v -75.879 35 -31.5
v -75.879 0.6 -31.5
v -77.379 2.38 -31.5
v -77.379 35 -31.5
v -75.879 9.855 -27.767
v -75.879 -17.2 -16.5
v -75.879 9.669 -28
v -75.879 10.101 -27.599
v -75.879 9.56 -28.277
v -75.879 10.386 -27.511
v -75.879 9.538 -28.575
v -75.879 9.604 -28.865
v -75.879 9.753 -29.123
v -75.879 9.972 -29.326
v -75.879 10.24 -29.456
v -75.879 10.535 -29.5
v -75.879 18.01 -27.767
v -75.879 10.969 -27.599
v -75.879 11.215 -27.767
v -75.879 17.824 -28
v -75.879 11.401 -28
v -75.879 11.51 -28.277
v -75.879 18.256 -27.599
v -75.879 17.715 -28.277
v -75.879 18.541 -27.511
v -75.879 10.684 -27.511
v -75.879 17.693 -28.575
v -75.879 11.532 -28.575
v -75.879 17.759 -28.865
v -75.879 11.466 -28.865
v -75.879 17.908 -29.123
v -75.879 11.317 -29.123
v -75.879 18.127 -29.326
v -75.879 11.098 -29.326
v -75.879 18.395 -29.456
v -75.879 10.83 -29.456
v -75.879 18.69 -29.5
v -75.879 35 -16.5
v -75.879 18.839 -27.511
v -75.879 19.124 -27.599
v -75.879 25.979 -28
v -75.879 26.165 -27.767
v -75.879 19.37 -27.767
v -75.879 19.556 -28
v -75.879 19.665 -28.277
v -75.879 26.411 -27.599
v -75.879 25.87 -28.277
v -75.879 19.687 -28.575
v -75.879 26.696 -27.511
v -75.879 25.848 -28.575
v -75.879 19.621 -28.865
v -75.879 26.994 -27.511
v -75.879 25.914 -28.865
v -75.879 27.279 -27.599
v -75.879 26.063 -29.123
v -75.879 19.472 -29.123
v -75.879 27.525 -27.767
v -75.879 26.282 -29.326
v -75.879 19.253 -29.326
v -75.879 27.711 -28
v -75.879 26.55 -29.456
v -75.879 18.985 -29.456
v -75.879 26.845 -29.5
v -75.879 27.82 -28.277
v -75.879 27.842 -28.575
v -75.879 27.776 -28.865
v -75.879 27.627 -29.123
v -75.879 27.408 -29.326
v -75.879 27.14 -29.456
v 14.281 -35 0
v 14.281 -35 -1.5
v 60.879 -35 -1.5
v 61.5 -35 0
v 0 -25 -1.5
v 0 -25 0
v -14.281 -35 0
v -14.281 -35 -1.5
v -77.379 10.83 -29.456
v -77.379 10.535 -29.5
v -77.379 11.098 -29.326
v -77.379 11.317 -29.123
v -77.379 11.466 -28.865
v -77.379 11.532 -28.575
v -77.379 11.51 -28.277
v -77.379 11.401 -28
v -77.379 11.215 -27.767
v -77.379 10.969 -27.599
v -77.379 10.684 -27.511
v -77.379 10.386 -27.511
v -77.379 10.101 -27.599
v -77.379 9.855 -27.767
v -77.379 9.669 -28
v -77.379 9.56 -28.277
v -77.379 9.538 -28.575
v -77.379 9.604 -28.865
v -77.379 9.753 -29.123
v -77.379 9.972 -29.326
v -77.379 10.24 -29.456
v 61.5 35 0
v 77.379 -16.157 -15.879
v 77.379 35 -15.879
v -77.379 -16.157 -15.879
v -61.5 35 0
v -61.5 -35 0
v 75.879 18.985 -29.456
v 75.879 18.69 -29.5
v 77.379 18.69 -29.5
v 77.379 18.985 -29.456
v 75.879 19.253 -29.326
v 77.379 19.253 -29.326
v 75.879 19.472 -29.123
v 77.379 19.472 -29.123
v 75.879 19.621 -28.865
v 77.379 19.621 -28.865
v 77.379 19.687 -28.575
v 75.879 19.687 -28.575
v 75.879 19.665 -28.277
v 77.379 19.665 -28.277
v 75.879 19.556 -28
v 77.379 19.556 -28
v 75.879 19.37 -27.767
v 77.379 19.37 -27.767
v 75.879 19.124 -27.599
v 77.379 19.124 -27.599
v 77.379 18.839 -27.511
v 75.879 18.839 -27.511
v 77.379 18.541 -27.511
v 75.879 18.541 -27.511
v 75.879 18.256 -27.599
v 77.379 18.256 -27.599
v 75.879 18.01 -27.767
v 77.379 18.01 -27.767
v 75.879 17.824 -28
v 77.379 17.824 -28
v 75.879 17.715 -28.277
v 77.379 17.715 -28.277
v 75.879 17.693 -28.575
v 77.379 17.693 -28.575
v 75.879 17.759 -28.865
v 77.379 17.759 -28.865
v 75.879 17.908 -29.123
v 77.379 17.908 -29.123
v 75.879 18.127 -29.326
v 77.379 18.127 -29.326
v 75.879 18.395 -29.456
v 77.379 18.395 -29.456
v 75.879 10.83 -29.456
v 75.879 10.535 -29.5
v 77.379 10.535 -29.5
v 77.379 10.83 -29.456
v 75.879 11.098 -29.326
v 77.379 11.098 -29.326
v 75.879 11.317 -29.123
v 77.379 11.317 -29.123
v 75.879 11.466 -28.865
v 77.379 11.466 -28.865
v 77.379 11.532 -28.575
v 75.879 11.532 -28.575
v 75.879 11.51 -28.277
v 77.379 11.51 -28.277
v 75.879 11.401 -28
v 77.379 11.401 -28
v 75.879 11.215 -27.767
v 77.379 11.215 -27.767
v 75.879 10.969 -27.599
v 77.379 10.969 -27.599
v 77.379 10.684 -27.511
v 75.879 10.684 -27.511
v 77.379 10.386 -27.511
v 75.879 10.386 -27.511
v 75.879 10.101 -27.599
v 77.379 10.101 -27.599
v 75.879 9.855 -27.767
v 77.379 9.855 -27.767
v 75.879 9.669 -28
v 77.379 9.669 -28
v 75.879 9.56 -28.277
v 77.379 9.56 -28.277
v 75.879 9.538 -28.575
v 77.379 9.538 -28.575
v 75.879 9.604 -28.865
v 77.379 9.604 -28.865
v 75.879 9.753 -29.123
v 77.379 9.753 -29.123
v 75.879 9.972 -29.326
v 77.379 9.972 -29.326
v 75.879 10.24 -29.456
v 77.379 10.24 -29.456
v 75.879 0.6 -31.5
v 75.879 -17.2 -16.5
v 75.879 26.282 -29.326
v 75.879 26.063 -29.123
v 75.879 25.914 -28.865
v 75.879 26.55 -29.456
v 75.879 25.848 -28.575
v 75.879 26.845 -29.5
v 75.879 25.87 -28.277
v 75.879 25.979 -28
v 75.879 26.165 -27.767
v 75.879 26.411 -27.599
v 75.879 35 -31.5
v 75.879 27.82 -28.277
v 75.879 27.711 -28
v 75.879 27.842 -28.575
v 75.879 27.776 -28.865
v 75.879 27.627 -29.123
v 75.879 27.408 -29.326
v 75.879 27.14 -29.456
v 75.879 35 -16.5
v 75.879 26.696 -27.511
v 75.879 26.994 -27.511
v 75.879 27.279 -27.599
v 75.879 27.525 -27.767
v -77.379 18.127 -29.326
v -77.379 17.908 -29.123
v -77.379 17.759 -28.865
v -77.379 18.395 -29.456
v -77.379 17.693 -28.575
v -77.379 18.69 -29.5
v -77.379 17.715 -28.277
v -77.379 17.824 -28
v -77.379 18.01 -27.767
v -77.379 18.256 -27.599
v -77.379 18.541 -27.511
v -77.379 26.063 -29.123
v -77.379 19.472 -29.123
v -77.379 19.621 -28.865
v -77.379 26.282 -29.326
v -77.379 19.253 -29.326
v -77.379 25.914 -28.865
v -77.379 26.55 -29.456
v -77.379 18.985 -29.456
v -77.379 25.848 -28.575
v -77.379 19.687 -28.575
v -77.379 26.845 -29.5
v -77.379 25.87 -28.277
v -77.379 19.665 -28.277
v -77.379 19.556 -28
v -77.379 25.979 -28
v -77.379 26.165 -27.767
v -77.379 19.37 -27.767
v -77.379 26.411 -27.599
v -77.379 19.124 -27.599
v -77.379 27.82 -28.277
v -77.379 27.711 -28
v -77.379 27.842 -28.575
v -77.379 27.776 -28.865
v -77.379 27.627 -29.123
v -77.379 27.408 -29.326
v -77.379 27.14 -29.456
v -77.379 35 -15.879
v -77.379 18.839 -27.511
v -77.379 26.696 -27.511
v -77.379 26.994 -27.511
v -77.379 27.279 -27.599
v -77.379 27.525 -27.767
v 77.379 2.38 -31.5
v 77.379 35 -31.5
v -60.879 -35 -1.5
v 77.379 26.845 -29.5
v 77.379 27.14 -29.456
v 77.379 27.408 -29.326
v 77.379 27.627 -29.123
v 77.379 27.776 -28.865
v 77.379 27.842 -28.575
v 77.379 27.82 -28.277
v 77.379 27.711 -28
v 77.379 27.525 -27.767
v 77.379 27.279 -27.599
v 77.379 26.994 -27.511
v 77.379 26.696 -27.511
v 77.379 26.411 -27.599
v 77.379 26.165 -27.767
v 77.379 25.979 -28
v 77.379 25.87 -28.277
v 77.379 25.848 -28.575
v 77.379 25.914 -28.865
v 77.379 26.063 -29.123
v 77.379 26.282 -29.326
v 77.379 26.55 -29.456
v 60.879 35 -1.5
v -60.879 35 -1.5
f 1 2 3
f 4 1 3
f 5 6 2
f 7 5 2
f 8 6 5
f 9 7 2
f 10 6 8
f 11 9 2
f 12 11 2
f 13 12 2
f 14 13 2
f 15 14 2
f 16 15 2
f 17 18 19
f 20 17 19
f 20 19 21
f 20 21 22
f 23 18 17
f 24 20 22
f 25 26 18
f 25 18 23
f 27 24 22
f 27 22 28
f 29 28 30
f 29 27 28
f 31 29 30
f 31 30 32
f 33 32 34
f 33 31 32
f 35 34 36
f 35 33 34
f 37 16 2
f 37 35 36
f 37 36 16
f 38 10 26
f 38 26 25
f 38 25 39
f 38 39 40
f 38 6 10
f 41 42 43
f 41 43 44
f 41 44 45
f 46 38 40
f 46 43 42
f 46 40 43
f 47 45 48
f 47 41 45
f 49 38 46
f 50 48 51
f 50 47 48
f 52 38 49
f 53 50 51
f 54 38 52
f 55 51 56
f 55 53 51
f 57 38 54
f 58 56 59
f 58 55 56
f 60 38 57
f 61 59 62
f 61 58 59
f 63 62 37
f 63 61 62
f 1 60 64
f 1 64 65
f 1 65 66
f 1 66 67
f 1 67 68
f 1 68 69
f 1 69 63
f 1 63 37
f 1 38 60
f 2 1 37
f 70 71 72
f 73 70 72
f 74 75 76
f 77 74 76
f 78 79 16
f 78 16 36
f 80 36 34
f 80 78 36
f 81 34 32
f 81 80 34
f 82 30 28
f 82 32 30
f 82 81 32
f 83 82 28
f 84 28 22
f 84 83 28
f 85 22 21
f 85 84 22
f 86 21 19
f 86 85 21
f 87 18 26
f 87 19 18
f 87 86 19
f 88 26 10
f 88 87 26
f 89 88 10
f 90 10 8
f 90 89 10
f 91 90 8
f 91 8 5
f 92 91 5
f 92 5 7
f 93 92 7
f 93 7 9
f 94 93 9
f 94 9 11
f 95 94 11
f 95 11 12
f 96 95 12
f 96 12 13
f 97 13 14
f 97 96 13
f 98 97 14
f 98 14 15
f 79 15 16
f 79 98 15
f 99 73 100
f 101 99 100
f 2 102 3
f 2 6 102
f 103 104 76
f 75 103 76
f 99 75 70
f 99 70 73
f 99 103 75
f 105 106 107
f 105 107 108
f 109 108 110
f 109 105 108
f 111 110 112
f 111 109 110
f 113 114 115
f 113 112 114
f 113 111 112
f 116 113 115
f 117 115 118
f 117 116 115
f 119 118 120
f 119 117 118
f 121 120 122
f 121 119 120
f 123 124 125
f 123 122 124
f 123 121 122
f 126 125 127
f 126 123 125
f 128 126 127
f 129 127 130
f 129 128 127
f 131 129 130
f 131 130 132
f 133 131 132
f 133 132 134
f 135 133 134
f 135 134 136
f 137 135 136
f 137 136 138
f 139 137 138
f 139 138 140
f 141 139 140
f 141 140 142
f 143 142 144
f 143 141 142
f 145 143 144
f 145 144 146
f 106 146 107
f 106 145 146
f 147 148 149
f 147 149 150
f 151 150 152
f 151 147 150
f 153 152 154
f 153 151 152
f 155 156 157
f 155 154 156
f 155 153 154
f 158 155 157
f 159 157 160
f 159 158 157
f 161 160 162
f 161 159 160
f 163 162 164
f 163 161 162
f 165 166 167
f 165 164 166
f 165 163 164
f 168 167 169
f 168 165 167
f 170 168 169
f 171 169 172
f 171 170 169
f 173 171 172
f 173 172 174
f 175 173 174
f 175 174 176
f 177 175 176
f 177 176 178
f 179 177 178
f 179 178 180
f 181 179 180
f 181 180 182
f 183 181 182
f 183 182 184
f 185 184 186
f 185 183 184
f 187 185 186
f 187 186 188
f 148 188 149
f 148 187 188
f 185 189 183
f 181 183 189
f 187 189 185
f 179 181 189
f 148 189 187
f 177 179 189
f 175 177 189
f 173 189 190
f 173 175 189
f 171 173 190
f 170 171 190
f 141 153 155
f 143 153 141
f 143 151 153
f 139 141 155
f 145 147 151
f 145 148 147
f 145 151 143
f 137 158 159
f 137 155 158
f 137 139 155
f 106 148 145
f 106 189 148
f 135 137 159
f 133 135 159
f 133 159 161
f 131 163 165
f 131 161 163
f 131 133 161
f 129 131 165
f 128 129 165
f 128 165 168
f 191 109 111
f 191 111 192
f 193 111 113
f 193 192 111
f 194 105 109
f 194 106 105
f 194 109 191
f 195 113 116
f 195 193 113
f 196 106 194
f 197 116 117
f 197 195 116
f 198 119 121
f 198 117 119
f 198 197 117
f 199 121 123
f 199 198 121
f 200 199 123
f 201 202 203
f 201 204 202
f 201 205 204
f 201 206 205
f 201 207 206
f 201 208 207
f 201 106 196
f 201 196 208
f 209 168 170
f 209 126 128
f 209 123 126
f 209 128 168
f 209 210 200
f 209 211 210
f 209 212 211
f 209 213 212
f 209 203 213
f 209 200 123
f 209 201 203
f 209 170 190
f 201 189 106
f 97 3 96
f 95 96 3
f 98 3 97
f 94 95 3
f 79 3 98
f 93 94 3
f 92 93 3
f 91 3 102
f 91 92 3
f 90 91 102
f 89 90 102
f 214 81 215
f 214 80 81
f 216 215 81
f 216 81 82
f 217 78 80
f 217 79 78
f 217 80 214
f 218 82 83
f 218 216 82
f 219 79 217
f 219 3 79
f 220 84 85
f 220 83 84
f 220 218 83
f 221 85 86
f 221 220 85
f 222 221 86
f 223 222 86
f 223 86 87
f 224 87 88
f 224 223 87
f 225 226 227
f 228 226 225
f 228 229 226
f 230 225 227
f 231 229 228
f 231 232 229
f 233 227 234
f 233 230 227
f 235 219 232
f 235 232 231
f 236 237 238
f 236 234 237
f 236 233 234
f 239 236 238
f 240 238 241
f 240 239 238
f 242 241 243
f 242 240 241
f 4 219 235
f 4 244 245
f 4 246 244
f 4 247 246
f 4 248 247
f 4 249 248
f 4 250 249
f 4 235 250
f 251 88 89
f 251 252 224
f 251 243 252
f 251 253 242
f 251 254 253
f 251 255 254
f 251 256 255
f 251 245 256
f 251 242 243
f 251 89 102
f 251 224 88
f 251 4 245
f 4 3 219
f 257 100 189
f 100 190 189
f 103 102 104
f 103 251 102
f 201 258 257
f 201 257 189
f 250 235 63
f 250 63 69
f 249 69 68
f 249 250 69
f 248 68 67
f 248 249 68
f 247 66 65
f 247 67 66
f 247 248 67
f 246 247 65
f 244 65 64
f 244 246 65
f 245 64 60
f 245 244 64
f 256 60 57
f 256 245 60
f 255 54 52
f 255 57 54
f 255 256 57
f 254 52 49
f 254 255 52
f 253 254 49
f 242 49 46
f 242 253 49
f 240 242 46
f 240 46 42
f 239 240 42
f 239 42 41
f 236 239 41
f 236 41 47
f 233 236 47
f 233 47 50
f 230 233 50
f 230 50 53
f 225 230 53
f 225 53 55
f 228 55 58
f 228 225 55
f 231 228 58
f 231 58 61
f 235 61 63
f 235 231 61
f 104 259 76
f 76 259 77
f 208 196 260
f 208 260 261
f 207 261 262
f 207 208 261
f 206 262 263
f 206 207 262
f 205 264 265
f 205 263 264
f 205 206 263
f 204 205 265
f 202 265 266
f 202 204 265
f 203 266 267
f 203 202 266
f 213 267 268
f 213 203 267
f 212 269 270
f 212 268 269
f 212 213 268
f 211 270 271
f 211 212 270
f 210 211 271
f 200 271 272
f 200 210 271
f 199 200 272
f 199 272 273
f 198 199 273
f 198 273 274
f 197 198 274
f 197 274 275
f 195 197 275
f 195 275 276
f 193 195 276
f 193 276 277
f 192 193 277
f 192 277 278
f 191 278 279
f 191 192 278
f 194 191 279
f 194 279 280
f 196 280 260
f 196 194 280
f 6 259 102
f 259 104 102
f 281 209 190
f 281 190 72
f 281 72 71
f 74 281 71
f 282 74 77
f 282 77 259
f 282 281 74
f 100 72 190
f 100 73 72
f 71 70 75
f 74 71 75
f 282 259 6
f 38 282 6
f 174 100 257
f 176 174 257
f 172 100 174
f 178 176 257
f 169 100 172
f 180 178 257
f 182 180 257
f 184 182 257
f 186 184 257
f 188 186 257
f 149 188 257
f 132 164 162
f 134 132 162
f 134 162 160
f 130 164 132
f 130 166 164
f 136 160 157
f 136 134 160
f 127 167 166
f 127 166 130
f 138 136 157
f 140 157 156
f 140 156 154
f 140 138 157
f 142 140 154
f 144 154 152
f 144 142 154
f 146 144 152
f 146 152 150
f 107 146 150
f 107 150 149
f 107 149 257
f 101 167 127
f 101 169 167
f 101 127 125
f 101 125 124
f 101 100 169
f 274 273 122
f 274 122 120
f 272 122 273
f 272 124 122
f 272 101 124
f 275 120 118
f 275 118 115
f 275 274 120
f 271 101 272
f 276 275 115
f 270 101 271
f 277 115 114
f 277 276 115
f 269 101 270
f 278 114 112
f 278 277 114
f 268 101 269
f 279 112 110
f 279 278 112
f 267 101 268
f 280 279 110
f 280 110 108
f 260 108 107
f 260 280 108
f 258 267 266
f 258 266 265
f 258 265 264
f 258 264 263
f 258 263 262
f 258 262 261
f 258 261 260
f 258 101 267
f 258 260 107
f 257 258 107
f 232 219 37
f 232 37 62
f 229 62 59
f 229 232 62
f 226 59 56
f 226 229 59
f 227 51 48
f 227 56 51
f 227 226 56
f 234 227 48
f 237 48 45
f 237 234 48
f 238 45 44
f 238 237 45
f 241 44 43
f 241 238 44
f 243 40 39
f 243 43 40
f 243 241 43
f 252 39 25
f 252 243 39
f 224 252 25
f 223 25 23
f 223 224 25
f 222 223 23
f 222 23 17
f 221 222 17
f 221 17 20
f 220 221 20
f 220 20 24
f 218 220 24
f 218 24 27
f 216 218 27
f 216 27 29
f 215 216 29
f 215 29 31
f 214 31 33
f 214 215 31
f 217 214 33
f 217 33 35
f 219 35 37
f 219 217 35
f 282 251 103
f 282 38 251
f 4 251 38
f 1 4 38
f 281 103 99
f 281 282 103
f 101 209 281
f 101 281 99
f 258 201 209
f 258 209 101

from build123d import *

# Parameters (mm, degrees)
BOSS_EXTRUDE1_DEPTH     = 35
CUT_EXTRUDE1_DEPTH      = 1.5
CUT_EXTRUDE7_DEPTH      = 91.579854792
CUT_EXTRUDE7_DEPTH_BACK = 91.579854792
SKETCH14_R              = 1


with BuildPart() as part:
    # Sketch1 → Boss-Extrude1 (new, symmetric)
    with BuildSketch(Plane(origin=(0, 0, 0), x_dir=(1, 0, 0), z_dir=(0, 1, 0))):
        Polygon((-61.5, 0), (61.5, 0), (77.378679656, 15.878679656), (77.378679656, 31.5), (75.878679656, 31.5), (75.878679656, 16.5), (60.878679656, 1.5), (-60.878679656, 1.5), (-75.878679656, 16.5), (-75.878679656, 31.5), (-77.378679656, 31.5), (-77.378679656, 15.878679656), align=None)
    extrude(amount=BOSS_EXTRUDE1_DEPTH, both=True)

    # Sketch2 → Cut-Extrude1 (cut)
    with BuildSketch(Plane.XY):
        Polygon((0, -25), (-14.281480067, -35), (14.281480067, -35), align=None)
    extrude(amount=-CUT_EXTRUDE1_DEPTH, mode=Mode.SUBTRACT)

    # Sketch12 → Cut-Loft1 section 0
    with BuildSketch(Plane(origin=(29.689339828, 0, 29.689339828), x_dir=(-0.7071067811865465, 0, 0.7071067811865488), z_dir=(-0.7071067811865488, 0, -0.7071067811865465))):
        with BuildLine():
            Line((-44.108387387, -35), (-65.321590822, -17.200008821))
            Line((-65.321590822, -17.200008821), (-65.321590822, -35))
            Line((-65.321590822, -35), (-44.108387387, -35))
        make_face()
    # Sketch7 → Cut-Loft1 section 1
    with BuildSketch(Plane(origin=(30.75, 0, 30.75), x_dir=(0.707106781186546, 0, -0.707106781186549), z_dir=(0.707106781186549, 0, 0.707106781186546))):
        with BuildLine():
            Line((43.487067043, -35), (65.942911166, -16.157309479))
            Line((65.942911166, -16.157309479), (65.942911166, -35))
            Line((65.942911166, -35), (43.487067043, -35))
        make_face()
    cut_loft1 = loft(mode=Mode.SUBTRACT)

    # Sketch8 → Cut-Loft2 section 0
    with BuildSketch(Plane(origin=(77.378679656, 0, 0), x_dir=(0, 0, -1), z_dir=(1, 0, 0))):
        with BuildLine():
            Line((15.878679656, -16.157309479), (31.5, 2.379981476))
            Line((31.5, 2.379981476), (31.5, -35))
            Line((31.5, -35), (15.878679656, -35))
            Line((15.878679656, -35), (15.878679656, -16.157309479))
        make_face()
    # Sketch13 → Cut-Loft2 section 1
    with BuildSketch(Plane.ZY.offset(-75.878679656)):
        with BuildLine():
            Line((-31.5, 0.599982358), (-31.5, -35))
            Line((-31.5, -35), (-16.5, -35))
            Line((-16.5, -35), (-16.5, -17.200008821))
            Line((-16.5, -17.200008821), (-31.5, 0.599982358))
        make_face()
    cut_loft2 = loft(mode=Mode.SUBTRACT)

    # Mirror1: Cut-Loft1, Cut-Loft2 across plane
    add(cut_loft1.mirror(Plane(origin=(0, 0, 0), x_dir=(0, 0, 1), z_dir=(1, 0, 0))), mode=Mode.SUBTRACT)
    add(cut_loft2.mirror(Plane(origin=(0, 0, 0), x_dir=(0, 0, 1), z_dir=(1, 0, 0))), mode=Mode.SUBTRACT)

    # Sketch14 → Cut-Extrude7 (cut, two sides: drawn at the far end of the back side and taken through both)
    with BuildSketch(Plane(origin=(0, 0, 0), x_dir=(0, 0, -1), z_dir=(1, 0, 0)).offset(-CUT_EXTRUDE7_DEPTH_BACK)):
        with Locations((28.5, 26.844995369)):
            Circle(SKETCH14_R)
        with Locations((28.5, 18.689990738)):
            Circle(SKETCH14_R)
        with Locations((28.5, 10.534986107)):
            Circle(SKETCH14_R)
    extrude(amount=CUT_EXTRUDE7_DEPTH + CUT_EXTRUDE7_DEPTH_BACK, mode=Mode.SUBTRACT)


solid = part.part
